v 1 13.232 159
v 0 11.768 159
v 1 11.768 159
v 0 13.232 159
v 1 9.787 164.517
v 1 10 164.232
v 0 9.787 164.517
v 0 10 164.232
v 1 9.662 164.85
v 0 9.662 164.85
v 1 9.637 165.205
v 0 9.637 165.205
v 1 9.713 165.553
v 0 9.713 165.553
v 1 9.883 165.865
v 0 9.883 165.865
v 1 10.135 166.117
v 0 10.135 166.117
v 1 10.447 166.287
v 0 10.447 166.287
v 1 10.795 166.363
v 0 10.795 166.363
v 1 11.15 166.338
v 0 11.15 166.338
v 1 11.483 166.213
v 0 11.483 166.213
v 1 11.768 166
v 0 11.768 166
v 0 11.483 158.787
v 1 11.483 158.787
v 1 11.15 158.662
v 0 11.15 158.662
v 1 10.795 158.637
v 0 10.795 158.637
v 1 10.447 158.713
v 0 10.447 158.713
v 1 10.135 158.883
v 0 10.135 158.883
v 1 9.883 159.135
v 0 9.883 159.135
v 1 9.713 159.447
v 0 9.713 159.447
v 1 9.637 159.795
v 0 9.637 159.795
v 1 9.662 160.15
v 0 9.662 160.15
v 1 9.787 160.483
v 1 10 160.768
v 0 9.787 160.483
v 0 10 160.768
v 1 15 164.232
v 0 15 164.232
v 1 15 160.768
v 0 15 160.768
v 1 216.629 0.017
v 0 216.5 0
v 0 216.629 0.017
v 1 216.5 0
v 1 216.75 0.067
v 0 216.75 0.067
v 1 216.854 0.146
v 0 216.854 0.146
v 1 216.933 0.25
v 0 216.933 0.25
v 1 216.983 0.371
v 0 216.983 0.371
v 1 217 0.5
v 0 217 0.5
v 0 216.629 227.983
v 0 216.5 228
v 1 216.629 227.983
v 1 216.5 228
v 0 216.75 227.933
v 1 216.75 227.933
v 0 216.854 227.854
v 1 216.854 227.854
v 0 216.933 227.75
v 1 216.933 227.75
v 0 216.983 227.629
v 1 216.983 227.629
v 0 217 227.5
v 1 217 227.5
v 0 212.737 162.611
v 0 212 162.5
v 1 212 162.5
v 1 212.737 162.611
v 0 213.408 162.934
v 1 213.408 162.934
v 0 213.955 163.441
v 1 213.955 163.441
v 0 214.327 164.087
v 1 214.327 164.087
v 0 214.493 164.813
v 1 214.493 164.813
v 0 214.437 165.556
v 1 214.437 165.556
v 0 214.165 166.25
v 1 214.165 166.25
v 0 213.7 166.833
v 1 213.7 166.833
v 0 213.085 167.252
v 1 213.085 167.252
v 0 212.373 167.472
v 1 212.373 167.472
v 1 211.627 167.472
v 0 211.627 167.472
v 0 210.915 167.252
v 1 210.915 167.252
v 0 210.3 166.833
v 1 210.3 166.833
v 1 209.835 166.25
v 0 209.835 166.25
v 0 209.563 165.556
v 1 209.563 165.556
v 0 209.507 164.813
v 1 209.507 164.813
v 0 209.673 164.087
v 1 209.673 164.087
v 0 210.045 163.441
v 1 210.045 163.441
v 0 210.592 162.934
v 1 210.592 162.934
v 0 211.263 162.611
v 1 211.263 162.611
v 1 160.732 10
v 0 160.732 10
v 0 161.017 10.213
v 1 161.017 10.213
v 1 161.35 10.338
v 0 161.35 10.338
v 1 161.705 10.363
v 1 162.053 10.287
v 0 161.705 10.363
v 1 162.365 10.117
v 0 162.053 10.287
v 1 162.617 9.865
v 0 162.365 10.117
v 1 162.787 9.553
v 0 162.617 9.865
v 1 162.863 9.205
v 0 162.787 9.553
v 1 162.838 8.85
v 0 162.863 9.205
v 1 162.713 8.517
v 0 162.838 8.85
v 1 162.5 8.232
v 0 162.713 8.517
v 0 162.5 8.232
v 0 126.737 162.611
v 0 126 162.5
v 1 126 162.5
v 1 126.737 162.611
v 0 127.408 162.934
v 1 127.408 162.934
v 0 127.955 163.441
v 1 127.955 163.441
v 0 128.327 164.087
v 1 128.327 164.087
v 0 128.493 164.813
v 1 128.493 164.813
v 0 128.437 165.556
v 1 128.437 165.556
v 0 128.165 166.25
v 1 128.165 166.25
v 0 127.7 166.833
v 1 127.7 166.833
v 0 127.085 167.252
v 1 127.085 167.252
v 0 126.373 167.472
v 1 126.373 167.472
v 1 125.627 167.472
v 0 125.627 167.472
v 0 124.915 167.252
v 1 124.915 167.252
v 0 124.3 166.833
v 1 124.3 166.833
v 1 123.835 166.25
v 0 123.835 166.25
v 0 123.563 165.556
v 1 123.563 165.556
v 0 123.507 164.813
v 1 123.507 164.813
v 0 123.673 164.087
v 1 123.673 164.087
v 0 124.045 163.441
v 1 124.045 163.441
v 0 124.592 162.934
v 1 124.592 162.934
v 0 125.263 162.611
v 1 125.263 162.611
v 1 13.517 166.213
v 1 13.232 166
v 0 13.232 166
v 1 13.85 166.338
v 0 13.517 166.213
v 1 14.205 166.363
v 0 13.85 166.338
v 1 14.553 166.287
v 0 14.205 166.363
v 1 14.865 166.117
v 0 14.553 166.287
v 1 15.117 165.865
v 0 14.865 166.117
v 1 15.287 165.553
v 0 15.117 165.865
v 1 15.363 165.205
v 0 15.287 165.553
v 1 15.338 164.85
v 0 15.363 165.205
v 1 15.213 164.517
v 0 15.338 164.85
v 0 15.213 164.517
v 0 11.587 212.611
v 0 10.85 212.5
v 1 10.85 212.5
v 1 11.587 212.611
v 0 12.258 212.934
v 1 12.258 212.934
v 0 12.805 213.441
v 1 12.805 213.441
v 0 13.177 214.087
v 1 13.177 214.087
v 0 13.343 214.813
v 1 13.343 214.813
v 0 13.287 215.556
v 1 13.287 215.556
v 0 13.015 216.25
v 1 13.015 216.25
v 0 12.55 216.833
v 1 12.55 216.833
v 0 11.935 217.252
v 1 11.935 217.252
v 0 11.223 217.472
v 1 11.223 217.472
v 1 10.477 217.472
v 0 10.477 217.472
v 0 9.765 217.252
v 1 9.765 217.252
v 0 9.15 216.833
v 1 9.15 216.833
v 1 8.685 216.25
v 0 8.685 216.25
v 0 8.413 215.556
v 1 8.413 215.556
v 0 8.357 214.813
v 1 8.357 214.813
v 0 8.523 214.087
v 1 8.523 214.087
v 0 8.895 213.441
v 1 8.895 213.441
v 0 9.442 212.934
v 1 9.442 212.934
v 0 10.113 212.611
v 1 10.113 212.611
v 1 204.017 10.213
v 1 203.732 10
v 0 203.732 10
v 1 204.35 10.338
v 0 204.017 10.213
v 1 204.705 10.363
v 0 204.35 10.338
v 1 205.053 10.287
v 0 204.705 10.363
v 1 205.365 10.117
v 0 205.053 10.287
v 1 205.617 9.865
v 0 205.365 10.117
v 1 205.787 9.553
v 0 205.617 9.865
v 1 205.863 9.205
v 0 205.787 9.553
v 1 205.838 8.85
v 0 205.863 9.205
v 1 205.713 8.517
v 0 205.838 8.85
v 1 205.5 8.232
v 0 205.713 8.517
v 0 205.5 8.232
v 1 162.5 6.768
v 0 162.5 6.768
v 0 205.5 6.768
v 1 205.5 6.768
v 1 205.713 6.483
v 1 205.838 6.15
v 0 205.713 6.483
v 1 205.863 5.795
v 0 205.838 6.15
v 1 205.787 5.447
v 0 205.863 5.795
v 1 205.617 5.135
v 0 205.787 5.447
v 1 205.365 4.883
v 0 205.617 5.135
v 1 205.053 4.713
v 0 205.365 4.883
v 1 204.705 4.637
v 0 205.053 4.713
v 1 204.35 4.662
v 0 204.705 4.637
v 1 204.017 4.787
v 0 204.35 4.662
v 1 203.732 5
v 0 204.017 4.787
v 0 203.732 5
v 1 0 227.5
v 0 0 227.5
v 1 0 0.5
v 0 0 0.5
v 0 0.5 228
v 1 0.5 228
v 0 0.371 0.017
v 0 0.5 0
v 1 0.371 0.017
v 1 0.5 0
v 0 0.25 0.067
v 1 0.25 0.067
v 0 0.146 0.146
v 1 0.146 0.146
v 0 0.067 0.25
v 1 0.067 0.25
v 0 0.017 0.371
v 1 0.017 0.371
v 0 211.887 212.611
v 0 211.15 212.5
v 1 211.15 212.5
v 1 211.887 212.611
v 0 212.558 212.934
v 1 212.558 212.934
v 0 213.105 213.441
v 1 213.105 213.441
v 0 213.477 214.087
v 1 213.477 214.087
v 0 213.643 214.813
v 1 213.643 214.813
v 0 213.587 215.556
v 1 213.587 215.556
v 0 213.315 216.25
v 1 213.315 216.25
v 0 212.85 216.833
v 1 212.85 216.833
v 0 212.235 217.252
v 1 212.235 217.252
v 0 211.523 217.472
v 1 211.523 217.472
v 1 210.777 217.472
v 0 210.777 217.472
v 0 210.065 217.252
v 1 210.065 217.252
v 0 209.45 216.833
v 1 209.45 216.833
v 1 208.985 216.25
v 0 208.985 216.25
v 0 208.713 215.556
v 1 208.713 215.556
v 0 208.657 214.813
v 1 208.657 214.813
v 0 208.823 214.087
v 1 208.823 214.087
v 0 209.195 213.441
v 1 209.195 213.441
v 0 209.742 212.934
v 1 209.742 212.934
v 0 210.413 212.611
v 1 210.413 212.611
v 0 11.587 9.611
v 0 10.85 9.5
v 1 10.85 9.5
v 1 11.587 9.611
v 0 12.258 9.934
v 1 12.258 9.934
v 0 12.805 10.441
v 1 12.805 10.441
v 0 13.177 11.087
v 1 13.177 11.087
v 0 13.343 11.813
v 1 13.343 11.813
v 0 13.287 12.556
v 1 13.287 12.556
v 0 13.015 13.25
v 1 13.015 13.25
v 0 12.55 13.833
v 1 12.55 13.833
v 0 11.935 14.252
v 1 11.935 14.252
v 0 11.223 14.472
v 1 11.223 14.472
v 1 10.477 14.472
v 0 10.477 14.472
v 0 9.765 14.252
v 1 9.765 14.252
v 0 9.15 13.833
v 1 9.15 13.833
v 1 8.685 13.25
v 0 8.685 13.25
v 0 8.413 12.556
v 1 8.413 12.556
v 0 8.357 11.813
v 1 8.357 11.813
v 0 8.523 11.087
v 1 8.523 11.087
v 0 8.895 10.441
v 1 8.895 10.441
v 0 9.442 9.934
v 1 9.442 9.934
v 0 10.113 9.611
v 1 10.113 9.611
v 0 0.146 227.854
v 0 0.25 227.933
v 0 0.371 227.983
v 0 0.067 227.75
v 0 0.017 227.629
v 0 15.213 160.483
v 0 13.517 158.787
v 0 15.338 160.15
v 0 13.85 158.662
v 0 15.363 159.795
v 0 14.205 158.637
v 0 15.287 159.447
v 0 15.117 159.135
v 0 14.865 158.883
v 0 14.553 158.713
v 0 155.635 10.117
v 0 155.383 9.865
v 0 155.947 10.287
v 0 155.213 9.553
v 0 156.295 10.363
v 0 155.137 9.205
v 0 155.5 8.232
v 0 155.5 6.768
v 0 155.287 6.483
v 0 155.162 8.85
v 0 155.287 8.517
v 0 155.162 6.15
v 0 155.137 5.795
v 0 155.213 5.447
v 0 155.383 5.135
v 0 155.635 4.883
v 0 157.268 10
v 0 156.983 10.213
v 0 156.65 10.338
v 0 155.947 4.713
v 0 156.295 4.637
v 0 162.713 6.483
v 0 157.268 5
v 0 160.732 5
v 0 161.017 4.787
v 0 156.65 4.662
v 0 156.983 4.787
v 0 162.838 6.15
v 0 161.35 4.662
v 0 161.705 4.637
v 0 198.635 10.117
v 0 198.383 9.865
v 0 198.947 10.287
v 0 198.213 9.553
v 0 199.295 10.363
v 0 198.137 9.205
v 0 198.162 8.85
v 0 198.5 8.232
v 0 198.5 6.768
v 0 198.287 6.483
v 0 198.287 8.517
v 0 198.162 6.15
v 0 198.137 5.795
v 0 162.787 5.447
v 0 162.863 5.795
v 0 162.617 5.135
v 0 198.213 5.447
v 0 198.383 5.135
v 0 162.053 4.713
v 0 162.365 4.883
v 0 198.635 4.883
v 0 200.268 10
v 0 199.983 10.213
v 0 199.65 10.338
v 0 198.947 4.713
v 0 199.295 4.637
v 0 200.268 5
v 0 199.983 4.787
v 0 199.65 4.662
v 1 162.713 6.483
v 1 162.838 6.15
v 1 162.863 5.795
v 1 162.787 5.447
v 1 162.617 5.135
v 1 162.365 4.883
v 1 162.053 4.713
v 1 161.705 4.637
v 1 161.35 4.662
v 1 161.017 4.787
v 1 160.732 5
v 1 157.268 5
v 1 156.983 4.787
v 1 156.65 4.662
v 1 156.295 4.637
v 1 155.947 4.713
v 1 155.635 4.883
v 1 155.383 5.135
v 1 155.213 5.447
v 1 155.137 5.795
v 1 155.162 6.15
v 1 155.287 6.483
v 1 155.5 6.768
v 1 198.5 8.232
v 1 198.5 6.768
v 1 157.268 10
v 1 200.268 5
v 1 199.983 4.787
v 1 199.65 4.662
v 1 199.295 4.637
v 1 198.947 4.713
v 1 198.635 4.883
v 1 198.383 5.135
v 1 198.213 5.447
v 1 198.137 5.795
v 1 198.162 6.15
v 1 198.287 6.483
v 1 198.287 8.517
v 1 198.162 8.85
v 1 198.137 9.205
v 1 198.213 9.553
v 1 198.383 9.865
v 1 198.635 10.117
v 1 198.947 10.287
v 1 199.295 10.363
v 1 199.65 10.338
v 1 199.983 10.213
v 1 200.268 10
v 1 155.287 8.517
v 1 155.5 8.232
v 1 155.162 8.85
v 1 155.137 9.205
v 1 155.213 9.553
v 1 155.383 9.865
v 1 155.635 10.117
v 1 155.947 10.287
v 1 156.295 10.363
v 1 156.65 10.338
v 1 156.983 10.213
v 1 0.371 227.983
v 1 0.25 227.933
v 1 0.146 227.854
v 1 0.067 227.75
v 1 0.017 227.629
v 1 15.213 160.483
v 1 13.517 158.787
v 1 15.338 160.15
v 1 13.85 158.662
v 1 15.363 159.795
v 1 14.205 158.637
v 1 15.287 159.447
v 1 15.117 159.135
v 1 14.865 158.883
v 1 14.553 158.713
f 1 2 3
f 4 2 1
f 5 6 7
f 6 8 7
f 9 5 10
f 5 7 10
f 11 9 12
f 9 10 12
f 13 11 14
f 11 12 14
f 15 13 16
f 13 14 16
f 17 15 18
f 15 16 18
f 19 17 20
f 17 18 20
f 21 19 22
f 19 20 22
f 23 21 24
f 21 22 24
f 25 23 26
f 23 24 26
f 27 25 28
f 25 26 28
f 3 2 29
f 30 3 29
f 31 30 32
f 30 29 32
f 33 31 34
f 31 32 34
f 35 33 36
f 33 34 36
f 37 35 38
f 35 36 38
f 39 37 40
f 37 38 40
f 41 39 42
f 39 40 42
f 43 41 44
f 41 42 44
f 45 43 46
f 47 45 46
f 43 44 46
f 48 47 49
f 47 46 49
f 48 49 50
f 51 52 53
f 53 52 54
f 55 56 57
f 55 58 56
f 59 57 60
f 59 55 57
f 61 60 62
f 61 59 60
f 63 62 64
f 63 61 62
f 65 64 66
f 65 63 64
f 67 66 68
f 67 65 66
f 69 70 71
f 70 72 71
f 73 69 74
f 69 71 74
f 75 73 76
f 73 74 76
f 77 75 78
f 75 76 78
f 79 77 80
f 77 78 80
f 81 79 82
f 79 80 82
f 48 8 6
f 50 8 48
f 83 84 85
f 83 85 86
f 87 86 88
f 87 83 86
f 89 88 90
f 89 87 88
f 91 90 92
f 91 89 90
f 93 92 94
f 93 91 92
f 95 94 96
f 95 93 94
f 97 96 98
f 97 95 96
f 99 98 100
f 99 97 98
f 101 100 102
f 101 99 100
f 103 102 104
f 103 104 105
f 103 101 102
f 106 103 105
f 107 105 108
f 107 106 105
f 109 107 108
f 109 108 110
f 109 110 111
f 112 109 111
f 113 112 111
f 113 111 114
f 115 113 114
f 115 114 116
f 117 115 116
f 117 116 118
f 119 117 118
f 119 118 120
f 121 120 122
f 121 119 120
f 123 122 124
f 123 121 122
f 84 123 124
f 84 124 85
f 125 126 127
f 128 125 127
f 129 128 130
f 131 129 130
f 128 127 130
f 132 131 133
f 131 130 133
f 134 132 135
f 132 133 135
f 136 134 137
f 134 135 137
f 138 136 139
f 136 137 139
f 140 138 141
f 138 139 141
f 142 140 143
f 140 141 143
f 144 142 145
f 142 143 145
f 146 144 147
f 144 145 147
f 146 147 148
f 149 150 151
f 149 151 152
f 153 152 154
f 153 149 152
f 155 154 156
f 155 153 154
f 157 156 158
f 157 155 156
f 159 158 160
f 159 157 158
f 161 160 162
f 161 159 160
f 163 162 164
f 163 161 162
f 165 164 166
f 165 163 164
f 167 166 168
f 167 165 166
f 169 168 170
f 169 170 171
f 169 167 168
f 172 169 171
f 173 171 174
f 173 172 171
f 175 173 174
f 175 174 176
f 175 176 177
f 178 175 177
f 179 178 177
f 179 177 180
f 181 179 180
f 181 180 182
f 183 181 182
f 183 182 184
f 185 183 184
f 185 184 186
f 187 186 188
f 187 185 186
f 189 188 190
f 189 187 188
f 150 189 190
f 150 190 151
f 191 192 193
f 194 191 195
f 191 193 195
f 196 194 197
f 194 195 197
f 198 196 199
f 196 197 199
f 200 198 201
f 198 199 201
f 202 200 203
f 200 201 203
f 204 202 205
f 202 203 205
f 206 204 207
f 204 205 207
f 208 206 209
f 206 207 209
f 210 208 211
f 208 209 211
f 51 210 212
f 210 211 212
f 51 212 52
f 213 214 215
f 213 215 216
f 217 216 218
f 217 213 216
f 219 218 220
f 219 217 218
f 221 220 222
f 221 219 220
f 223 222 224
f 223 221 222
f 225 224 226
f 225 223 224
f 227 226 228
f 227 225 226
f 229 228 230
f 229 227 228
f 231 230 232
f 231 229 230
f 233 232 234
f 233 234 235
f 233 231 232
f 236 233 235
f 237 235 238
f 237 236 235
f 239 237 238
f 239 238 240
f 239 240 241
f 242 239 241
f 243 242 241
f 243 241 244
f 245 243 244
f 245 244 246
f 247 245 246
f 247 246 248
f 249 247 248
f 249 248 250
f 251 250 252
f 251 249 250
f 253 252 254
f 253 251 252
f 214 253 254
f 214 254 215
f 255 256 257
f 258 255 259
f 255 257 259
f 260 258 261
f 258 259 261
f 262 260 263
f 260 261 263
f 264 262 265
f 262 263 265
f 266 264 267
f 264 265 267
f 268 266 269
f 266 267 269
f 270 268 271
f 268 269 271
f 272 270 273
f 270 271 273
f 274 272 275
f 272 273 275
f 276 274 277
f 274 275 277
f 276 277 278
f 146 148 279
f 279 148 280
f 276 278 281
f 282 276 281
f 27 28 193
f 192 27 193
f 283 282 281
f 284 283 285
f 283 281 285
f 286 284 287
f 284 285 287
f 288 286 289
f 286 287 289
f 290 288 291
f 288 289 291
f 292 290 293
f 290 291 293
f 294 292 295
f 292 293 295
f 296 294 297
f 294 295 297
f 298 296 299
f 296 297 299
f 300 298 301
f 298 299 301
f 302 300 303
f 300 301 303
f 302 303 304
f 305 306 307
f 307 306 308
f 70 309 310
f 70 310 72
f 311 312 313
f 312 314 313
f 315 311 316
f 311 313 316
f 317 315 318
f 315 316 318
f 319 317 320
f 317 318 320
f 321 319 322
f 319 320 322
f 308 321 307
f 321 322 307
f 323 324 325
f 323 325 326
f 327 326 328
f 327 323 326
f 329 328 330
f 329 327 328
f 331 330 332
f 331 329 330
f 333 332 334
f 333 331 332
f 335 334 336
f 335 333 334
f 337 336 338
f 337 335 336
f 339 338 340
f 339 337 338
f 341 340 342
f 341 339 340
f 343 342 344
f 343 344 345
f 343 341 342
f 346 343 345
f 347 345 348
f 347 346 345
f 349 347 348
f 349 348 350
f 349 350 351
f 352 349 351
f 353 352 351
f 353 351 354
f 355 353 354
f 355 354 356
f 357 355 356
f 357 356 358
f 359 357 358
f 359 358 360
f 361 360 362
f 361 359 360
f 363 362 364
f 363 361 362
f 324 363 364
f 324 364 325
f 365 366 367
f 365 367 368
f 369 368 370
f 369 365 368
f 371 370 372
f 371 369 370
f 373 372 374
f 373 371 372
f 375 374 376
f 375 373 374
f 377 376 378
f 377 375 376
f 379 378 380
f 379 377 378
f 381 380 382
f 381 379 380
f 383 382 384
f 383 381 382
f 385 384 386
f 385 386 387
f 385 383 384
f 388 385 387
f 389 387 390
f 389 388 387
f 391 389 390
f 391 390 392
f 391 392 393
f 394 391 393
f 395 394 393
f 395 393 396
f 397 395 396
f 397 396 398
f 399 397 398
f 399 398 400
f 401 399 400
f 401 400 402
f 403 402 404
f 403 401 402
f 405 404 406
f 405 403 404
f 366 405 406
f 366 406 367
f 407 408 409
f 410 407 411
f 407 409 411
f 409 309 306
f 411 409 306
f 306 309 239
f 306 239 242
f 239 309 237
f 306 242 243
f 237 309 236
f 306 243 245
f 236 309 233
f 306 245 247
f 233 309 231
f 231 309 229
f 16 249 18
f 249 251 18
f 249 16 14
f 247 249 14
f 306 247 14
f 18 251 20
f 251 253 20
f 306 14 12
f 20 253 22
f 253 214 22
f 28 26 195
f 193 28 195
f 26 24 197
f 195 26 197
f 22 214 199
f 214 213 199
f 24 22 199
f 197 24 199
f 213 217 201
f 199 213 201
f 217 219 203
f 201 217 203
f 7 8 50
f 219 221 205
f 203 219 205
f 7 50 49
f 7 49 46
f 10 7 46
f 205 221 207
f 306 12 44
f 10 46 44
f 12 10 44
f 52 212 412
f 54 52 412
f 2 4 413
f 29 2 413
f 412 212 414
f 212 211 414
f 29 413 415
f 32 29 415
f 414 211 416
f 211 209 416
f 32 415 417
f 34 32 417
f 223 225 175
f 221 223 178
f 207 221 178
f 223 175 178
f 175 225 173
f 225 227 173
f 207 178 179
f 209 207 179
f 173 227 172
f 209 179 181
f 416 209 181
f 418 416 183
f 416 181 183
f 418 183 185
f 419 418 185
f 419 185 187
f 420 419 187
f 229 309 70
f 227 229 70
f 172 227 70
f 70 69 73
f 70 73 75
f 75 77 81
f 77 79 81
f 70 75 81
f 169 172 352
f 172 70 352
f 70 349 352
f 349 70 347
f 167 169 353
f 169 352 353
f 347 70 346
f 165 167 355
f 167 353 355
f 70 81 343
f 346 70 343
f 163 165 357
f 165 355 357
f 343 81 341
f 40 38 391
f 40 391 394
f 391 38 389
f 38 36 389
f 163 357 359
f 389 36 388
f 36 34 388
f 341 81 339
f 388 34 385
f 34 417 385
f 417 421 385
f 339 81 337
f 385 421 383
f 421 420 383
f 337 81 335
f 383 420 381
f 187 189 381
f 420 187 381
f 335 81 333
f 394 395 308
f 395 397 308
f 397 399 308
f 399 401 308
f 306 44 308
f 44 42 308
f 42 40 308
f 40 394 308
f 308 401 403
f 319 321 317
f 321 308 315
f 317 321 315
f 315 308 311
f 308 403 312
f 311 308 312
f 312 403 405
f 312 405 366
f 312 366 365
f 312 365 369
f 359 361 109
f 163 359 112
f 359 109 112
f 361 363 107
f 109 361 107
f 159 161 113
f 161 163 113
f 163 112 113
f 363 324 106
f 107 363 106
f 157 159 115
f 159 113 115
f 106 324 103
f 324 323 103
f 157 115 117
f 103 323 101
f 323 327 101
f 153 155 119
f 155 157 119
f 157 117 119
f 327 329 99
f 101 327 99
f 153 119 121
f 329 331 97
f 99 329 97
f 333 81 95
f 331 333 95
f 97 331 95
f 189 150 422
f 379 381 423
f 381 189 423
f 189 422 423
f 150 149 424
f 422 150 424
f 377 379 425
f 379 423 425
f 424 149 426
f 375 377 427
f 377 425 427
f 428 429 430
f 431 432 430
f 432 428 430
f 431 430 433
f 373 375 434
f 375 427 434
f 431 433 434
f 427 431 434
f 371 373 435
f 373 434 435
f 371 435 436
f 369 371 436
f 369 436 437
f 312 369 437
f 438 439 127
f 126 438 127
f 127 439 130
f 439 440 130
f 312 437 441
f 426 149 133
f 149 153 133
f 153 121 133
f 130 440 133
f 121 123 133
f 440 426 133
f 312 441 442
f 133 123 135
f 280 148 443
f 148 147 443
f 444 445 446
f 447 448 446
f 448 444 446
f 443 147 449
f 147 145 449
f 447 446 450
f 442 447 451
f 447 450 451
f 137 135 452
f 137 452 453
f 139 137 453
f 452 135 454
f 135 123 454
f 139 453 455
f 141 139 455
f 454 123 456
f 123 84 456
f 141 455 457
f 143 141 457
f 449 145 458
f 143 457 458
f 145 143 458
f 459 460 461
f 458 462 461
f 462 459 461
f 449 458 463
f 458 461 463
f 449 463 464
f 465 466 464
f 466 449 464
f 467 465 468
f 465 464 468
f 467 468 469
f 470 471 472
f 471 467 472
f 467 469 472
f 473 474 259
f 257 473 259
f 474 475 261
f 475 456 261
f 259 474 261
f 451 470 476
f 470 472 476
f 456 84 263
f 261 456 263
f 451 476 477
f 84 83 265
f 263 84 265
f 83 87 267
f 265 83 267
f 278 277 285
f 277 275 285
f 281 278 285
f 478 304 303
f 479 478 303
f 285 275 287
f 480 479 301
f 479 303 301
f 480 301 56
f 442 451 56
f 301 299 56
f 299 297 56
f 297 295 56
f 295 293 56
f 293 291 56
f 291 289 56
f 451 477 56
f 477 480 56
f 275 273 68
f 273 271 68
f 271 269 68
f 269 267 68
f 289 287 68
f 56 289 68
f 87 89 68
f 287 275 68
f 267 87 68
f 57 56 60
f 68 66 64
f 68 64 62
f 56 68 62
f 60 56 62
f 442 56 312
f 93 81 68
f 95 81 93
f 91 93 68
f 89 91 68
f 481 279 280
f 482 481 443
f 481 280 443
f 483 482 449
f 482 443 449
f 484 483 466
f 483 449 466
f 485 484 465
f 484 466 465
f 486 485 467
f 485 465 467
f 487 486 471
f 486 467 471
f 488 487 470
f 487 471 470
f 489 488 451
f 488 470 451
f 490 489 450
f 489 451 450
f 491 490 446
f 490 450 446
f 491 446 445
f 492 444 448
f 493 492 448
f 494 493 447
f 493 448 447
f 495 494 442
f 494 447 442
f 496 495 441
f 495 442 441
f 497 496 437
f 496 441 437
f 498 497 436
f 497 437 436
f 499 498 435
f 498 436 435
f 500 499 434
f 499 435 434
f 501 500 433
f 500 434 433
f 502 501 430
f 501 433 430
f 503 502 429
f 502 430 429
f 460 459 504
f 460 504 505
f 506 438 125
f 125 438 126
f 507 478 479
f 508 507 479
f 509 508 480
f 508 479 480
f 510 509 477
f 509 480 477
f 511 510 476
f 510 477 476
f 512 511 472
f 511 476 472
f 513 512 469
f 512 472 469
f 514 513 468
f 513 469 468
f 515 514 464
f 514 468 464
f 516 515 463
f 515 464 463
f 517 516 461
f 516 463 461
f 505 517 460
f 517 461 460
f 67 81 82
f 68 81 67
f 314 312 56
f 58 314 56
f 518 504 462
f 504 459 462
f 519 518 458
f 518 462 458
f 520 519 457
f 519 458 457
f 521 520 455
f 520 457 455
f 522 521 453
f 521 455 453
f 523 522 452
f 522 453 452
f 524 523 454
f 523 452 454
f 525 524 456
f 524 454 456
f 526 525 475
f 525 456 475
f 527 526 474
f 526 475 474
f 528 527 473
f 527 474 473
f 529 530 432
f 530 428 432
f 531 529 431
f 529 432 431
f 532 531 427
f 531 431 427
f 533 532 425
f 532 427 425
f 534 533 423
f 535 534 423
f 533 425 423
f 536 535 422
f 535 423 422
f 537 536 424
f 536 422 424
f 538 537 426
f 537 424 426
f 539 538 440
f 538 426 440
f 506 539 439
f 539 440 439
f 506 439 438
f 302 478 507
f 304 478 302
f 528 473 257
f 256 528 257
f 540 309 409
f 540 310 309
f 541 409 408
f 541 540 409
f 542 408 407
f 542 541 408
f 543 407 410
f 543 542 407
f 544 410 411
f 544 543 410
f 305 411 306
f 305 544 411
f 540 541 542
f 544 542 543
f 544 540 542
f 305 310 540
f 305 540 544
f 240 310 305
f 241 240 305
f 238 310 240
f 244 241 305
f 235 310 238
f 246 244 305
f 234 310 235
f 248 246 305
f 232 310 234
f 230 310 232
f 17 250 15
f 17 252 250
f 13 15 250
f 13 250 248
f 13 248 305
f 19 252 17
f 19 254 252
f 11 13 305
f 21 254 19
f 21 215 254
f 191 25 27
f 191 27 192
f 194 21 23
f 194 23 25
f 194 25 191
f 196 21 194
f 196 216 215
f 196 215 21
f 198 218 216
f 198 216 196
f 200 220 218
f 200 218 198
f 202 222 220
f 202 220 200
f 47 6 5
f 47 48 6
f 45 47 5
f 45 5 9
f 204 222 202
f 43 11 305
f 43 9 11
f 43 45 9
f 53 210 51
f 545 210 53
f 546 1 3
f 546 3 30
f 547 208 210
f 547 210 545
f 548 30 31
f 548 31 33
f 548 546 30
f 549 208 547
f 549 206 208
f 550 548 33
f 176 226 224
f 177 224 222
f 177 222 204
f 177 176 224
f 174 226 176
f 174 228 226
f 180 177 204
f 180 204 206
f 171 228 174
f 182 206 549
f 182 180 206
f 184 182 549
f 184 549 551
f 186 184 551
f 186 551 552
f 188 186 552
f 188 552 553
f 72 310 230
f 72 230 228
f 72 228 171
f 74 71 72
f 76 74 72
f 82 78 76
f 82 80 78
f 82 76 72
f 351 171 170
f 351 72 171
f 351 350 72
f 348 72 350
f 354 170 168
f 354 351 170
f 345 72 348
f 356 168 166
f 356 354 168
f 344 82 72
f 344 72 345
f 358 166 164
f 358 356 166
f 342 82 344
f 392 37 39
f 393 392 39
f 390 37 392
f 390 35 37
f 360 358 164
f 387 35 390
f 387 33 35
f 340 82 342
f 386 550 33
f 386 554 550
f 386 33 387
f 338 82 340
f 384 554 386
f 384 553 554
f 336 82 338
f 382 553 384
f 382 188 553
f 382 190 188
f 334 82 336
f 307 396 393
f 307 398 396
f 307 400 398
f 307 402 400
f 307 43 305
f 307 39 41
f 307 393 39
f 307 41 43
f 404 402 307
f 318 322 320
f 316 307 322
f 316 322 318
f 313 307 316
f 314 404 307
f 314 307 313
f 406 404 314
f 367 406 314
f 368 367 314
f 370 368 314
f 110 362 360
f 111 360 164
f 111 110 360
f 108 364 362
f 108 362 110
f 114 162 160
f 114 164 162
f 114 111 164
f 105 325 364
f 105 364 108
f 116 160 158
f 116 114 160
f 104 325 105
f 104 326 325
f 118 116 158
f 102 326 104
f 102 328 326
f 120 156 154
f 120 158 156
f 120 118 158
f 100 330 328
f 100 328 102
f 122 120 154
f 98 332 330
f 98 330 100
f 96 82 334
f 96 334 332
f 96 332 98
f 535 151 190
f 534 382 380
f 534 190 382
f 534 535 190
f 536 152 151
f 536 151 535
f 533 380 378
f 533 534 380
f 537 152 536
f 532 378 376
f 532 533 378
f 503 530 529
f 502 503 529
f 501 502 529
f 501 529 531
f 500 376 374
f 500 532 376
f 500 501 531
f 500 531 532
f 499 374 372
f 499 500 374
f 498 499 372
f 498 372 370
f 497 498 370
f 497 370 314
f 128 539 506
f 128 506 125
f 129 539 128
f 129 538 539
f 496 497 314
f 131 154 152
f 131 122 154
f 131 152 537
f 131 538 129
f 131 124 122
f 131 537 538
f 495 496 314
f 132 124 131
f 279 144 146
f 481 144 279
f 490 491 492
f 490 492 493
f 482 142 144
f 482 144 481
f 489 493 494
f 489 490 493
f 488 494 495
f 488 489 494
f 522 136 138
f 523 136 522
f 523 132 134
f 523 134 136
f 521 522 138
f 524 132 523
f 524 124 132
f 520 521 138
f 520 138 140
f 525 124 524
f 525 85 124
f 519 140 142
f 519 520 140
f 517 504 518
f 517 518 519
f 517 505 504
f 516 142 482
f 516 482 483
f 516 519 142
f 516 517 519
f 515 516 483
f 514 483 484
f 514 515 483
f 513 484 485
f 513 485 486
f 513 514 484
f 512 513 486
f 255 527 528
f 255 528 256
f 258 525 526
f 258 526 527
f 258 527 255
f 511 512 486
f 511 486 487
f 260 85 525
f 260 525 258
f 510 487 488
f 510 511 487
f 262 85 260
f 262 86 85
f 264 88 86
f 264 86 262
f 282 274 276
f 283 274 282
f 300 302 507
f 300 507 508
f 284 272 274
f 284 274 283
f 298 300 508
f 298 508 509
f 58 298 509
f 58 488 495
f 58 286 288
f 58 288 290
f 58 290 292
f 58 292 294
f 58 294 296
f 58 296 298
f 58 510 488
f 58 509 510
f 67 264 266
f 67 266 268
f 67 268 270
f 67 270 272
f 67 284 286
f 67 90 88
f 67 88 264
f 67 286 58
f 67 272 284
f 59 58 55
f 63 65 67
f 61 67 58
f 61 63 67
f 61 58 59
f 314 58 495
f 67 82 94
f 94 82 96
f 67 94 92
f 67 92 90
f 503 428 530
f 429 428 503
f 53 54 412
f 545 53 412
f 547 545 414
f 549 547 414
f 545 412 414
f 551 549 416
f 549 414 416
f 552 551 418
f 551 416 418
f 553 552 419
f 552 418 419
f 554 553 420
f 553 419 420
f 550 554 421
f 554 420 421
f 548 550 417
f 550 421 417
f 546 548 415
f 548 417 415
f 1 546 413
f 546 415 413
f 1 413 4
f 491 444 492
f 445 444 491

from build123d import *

# Parameters (mm, degrees)
SKETCH1_W           = 228
SKETCH1_H           = 217
SKETCH1_R           = 2.5
SKETCH1_W_2         = 5
SKETCH1_H_2         = 7
SKETCH1_W_3         = 7
SKETCH1_H_3         = 5
BOSS_EXTRUDE1_DEPTH = 1
SKETCH3_R           = 1.25
CUT_EXTRUDE3_DEPTH  = 315.760226204
FILLET1_R           = 0.5


with BuildPart() as part:
    # Sketch1 → Boss-Extrude1 (new body)
    with BuildSketch(Plane(origin=(0, 0, 0), x_dir=(0, 0, -1), z_dir=(1, 0, 0))):
        with Locations((-114, 108.5)):
            Rectangle(SKETCH1_W, SKETCH1_H)
        with Locations((-215, 10.85)):
            Circle(SKETCH1_R, mode=Mode.SUBTRACT)
        with Locations((-215, 211.15)):
            Circle(SKETCH1_R, mode=Mode.SUBTRACT)
        with Locations((-165, 212)):
            Circle(SKETCH1_R, mode=Mode.SUBTRACT)
        with Locations((-165, 126)):
            Circle(SKETCH1_R, mode=Mode.SUBTRACT)
        with Locations((-12, 10.85)):
            Circle(SKETCH1_R, mode=Mode.SUBTRACT)
        with Locations((-7.5, 202)):
            Rectangle(SKETCH1_W_2, SKETCH1_H_2, mode=Mode.SUBTRACT)
        with Locations((-7.5, 159)):
            Rectangle(SKETCH1_W_2, SKETCH1_H_2, mode=Mode.SUBTRACT)
        with Locations((-162.5, 12.5)):
            Rectangle(SKETCH1_W_3, SKETCH1_H_3, mode=Mode.SUBTRACT)
    extrude(amount=BOSS_EXTRUDE1_DEPTH)

    # Sketch3 → Cut-Extrude3 (cut, through all)
    with BuildSketch(Plane.ZY):
        with Locations((5.883883476, 204.616116524)):
            Circle(SKETCH3_R)
        with Locations((9.116116524, 204.616116524)):
            Circle(SKETCH3_R)
        with Locations((5.883883476, 199.383883476)):
            Circle(SKETCH3_R)
        with Locations((9.116116524, 199.383883476)):
            Circle(SKETCH3_R)
        with Locations((9.116116524, 161.616116524)):
            Circle(SKETCH3_R)
        with Locations((5.883883476, 161.616116524)):
            Circle(SKETCH3_R)
        with Locations((9.116116524, 156.383883476)):
            Circle(SKETCH3_R)
        with Locations((5.883883476, 156.383883476)):
            Circle(SKETCH3_R)
        with Locations((165.116116524, 14.116116524)):
            Circle(SKETCH3_R)
        with Locations((165.116116524, 10.883883476)):
            Circle(SKETCH3_R)
        with Locations((159.883883476, 10.883883476)):
            Circle(SKETCH3_R)
        with Locations((159.883883476, 14.116116524)):
            Circle(SKETCH3_R)
    extrude(amount=-CUT_EXTRUDE3_DEPTH, mode=Mode.SUBTRACT)

    # Fillet1
    fillet1_edges = [part.edges().sort_by_distance(p)[0] for p in [
        (0.5, 0, 0),
        (0.5, 0, 228),
        (0.5, 217, 228),
        (0.5, 217, 0),
    ]]
    fillet(fillet1_edges, radius=FILLET1_R)


solid = part.part
